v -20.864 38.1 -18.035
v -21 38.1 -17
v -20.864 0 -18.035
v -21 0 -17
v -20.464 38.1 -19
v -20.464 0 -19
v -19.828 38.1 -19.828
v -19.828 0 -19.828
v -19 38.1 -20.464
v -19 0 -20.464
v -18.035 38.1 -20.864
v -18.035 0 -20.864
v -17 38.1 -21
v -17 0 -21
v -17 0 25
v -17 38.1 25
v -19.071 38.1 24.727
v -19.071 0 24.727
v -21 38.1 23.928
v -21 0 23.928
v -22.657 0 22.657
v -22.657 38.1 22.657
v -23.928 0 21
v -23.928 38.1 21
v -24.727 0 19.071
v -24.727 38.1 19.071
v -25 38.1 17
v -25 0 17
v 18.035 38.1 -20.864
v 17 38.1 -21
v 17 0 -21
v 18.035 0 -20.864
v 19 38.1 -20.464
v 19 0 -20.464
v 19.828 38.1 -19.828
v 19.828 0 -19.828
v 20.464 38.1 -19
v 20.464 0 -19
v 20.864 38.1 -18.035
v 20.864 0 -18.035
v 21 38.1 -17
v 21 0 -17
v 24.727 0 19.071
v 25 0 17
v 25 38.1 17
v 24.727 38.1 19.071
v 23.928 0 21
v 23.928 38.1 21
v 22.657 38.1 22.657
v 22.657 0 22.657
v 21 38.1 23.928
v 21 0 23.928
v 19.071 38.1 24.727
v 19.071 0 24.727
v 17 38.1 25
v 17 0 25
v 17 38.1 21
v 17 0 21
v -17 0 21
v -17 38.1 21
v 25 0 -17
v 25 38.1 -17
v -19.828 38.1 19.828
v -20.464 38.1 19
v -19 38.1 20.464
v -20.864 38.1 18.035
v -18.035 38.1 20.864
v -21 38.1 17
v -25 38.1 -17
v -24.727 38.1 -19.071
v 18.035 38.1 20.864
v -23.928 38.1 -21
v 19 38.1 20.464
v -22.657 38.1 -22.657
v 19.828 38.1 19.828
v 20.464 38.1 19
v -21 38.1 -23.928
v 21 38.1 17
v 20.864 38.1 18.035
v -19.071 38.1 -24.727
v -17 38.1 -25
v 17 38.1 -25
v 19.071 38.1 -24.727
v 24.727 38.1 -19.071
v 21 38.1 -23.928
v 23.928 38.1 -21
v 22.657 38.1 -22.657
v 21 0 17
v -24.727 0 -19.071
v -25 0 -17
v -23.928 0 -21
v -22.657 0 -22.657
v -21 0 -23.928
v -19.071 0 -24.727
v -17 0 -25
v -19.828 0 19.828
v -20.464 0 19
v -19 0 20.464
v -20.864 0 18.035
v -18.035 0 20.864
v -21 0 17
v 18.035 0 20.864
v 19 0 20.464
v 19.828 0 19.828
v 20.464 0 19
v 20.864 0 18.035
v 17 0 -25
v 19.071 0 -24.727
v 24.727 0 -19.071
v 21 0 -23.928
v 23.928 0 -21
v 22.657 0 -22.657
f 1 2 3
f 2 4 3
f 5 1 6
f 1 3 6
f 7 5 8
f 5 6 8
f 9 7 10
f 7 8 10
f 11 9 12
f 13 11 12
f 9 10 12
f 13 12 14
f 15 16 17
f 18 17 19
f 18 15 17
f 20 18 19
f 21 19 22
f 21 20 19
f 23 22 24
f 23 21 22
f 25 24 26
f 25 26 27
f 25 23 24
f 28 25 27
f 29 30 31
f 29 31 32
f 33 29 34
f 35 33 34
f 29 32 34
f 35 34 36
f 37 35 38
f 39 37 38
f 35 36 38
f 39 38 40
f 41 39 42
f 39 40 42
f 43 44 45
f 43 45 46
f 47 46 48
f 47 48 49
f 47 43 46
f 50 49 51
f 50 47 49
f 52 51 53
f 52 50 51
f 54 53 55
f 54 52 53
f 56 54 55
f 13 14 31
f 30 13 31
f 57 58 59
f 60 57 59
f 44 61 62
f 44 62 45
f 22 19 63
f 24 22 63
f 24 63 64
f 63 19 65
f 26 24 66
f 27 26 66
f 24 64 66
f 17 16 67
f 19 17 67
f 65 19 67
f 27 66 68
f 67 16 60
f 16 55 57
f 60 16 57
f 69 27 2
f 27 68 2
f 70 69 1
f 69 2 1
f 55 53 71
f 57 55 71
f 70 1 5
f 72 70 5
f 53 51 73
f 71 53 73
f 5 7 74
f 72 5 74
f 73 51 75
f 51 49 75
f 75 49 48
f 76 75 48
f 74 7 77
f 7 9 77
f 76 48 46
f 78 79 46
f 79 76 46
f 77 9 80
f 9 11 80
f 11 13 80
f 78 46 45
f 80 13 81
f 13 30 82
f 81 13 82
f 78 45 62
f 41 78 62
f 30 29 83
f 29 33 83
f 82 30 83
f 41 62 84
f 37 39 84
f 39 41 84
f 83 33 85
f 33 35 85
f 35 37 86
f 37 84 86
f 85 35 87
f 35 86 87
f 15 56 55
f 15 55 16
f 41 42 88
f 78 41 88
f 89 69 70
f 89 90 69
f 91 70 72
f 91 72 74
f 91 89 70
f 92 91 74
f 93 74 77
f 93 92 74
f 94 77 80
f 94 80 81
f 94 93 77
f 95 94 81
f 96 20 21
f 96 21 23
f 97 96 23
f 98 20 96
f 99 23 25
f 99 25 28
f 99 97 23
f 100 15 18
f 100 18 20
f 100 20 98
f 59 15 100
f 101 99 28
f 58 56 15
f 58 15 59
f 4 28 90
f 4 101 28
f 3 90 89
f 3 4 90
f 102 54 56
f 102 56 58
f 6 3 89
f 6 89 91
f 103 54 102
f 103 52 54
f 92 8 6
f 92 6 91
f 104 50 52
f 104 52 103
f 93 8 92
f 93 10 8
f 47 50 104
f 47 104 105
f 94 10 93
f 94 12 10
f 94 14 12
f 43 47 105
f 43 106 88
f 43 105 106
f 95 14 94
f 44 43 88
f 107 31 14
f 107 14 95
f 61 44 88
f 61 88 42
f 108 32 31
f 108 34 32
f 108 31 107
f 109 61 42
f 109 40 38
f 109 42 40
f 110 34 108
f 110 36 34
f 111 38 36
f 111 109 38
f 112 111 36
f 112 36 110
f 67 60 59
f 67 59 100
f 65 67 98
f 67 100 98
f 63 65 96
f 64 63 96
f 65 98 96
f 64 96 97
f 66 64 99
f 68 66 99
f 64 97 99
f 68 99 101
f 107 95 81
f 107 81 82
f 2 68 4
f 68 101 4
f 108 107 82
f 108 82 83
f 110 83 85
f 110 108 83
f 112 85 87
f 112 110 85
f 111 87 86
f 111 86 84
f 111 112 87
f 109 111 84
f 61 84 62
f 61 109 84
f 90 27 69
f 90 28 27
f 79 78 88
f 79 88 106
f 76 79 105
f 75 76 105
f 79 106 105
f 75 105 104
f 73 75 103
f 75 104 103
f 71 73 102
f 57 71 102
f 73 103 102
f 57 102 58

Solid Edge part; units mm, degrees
sketch "Sketch1" plane through (0, 0, 0) normal (0, -1, 0) x (1, 0, 0)
  line L0 (17, 21) -> (-17, 21)
  arc A0 (-17, 21) -> (-21, 17) centre (-17, 17) ccw
  line L1 (-21, 17) -> (-21, -17)
  arc A1 (-21, -17) -> (-17, -21) centre (-17, -17) ccw
  line L2 (-17, -21) -> (17, -21)
  arc A2 (17, -21) -> (21, -17) centre (17, -17) ccw
  line L3 (21, -17) -> (21, 17)
  arc A3 (21, 17) -> (17, 21) centre (17, 17) ccw
  arc A4 (-17, 25) -> (-25, 17) centre (-17, 17) ccw
  line L4 (-25, 17) -> (-25, -17)
  arc A5 (-25, -17) -> (-17, -25) centre (-17, -17) ccw
  line L5 (-17, -25) -> (17, -25)
  arc A6 (17, -25) -> (25, -17) centre (17, -17) ccw
  line L6 (25, -17) -> (25, 17)
  arc A7 (25, 17) -> (17, 25) centre (17, 17) ccw
  line L7 (17, 25) -> (-17, 25)
  dimension "D1" = 50
  dimension "D2" = 50
  dimension "D3" = 4
extrude "Protrusion1" add sketch "Sketch1" against normal blind 38.1
